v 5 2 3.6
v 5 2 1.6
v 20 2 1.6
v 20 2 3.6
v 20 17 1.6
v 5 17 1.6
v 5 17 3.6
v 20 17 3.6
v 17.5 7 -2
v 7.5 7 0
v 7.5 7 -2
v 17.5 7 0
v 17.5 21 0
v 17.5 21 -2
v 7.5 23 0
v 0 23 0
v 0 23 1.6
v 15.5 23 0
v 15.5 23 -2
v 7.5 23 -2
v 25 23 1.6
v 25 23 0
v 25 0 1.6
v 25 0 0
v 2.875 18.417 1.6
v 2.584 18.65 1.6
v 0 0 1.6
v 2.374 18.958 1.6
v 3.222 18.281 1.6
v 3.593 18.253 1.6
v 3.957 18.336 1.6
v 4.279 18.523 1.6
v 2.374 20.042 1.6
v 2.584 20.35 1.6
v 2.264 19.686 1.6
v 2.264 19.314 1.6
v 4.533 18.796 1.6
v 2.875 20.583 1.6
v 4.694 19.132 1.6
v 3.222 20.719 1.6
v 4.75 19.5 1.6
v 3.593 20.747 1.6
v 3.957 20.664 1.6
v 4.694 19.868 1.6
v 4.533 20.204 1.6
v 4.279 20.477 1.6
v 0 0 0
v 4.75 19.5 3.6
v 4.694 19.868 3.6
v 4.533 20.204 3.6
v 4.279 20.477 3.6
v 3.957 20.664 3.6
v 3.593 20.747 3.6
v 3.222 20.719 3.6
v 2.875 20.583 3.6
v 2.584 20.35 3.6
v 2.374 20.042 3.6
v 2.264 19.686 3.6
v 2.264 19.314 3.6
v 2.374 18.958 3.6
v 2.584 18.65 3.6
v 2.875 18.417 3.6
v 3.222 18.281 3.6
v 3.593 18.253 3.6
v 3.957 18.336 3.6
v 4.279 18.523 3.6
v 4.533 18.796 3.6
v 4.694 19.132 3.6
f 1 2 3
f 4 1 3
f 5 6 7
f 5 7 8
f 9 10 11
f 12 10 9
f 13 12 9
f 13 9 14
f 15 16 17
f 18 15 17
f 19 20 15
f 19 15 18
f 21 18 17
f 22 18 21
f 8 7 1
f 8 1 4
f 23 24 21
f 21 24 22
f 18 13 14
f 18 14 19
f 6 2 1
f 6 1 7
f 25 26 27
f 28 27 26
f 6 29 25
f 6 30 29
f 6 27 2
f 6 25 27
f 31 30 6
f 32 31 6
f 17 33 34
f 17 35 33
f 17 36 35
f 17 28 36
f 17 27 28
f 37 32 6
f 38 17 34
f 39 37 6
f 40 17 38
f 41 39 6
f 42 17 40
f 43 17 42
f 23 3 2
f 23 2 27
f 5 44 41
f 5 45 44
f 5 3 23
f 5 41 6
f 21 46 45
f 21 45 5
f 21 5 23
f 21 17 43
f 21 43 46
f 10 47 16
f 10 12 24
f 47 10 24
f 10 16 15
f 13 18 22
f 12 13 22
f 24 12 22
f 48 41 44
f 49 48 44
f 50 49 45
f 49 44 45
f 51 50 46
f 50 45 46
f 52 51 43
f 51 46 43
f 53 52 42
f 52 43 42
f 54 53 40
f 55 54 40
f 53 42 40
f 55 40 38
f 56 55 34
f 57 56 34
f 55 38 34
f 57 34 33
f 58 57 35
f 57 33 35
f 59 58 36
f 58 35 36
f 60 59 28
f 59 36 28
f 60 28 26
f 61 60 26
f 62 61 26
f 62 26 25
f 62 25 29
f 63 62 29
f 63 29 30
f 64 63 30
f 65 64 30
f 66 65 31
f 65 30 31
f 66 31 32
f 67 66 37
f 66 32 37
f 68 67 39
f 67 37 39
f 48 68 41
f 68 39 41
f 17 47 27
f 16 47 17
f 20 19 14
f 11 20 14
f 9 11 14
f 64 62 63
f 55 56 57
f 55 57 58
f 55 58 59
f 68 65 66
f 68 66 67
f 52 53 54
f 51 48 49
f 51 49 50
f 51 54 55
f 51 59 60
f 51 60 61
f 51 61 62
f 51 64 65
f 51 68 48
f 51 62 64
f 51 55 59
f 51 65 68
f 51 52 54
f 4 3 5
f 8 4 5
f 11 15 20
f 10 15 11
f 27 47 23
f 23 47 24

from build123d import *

# Parameters (mm, degrees)
SKETCH_1_W      = 25
SKETCH_1_H      = 23
EXTRUDE_1_DEPTH = 1.6
SKETCH_2_R      = 1.25
SKETCH_2_W      = 15
SKETCH_2_H      = 15
EXTRUDE_2_DEPTH = 2
EXTRUDE_3_DEPTH = 2


with BuildPart() as part:
    # Эскиз1 → Бобышка-Вытянуть1 (new body)
    with BuildSketch(Plane.XY):
        with Locations((12.5, 11.5)):
            Rectangle(SKETCH_1_W, SKETCH_1_H)
    extrude(amount=EXTRUDE_1_DEPTH)

    # Эскиз2 → Бобышка-Вытянуть2 (add)
    with BuildSketch(Plane.XY.offset(1.6)):
        with Locations((3.5, 19.5)):
            Circle(SKETCH_2_R)
        with Locations((12.5, 9.5)):
            Rectangle(SKETCH_2_W, SKETCH_2_H)
    extrude(amount=EXTRUDE_2_DEPTH)

    # Эскиз3 → Бобышка-Вытянуть3 (add)
    with BuildSketch(Plane(origin=(0, 0, 0), x_dir=(-1, 0, 0), z_dir=(0, 0, -1))):
        Polygon((-15.5, 23), (-7.5, 23), (-7.5, 7), (-17.5, 7), (-17.5, 21), align=None)
    extrude(amount=EXTRUDE_3_DEPTH)


solid = part.part
